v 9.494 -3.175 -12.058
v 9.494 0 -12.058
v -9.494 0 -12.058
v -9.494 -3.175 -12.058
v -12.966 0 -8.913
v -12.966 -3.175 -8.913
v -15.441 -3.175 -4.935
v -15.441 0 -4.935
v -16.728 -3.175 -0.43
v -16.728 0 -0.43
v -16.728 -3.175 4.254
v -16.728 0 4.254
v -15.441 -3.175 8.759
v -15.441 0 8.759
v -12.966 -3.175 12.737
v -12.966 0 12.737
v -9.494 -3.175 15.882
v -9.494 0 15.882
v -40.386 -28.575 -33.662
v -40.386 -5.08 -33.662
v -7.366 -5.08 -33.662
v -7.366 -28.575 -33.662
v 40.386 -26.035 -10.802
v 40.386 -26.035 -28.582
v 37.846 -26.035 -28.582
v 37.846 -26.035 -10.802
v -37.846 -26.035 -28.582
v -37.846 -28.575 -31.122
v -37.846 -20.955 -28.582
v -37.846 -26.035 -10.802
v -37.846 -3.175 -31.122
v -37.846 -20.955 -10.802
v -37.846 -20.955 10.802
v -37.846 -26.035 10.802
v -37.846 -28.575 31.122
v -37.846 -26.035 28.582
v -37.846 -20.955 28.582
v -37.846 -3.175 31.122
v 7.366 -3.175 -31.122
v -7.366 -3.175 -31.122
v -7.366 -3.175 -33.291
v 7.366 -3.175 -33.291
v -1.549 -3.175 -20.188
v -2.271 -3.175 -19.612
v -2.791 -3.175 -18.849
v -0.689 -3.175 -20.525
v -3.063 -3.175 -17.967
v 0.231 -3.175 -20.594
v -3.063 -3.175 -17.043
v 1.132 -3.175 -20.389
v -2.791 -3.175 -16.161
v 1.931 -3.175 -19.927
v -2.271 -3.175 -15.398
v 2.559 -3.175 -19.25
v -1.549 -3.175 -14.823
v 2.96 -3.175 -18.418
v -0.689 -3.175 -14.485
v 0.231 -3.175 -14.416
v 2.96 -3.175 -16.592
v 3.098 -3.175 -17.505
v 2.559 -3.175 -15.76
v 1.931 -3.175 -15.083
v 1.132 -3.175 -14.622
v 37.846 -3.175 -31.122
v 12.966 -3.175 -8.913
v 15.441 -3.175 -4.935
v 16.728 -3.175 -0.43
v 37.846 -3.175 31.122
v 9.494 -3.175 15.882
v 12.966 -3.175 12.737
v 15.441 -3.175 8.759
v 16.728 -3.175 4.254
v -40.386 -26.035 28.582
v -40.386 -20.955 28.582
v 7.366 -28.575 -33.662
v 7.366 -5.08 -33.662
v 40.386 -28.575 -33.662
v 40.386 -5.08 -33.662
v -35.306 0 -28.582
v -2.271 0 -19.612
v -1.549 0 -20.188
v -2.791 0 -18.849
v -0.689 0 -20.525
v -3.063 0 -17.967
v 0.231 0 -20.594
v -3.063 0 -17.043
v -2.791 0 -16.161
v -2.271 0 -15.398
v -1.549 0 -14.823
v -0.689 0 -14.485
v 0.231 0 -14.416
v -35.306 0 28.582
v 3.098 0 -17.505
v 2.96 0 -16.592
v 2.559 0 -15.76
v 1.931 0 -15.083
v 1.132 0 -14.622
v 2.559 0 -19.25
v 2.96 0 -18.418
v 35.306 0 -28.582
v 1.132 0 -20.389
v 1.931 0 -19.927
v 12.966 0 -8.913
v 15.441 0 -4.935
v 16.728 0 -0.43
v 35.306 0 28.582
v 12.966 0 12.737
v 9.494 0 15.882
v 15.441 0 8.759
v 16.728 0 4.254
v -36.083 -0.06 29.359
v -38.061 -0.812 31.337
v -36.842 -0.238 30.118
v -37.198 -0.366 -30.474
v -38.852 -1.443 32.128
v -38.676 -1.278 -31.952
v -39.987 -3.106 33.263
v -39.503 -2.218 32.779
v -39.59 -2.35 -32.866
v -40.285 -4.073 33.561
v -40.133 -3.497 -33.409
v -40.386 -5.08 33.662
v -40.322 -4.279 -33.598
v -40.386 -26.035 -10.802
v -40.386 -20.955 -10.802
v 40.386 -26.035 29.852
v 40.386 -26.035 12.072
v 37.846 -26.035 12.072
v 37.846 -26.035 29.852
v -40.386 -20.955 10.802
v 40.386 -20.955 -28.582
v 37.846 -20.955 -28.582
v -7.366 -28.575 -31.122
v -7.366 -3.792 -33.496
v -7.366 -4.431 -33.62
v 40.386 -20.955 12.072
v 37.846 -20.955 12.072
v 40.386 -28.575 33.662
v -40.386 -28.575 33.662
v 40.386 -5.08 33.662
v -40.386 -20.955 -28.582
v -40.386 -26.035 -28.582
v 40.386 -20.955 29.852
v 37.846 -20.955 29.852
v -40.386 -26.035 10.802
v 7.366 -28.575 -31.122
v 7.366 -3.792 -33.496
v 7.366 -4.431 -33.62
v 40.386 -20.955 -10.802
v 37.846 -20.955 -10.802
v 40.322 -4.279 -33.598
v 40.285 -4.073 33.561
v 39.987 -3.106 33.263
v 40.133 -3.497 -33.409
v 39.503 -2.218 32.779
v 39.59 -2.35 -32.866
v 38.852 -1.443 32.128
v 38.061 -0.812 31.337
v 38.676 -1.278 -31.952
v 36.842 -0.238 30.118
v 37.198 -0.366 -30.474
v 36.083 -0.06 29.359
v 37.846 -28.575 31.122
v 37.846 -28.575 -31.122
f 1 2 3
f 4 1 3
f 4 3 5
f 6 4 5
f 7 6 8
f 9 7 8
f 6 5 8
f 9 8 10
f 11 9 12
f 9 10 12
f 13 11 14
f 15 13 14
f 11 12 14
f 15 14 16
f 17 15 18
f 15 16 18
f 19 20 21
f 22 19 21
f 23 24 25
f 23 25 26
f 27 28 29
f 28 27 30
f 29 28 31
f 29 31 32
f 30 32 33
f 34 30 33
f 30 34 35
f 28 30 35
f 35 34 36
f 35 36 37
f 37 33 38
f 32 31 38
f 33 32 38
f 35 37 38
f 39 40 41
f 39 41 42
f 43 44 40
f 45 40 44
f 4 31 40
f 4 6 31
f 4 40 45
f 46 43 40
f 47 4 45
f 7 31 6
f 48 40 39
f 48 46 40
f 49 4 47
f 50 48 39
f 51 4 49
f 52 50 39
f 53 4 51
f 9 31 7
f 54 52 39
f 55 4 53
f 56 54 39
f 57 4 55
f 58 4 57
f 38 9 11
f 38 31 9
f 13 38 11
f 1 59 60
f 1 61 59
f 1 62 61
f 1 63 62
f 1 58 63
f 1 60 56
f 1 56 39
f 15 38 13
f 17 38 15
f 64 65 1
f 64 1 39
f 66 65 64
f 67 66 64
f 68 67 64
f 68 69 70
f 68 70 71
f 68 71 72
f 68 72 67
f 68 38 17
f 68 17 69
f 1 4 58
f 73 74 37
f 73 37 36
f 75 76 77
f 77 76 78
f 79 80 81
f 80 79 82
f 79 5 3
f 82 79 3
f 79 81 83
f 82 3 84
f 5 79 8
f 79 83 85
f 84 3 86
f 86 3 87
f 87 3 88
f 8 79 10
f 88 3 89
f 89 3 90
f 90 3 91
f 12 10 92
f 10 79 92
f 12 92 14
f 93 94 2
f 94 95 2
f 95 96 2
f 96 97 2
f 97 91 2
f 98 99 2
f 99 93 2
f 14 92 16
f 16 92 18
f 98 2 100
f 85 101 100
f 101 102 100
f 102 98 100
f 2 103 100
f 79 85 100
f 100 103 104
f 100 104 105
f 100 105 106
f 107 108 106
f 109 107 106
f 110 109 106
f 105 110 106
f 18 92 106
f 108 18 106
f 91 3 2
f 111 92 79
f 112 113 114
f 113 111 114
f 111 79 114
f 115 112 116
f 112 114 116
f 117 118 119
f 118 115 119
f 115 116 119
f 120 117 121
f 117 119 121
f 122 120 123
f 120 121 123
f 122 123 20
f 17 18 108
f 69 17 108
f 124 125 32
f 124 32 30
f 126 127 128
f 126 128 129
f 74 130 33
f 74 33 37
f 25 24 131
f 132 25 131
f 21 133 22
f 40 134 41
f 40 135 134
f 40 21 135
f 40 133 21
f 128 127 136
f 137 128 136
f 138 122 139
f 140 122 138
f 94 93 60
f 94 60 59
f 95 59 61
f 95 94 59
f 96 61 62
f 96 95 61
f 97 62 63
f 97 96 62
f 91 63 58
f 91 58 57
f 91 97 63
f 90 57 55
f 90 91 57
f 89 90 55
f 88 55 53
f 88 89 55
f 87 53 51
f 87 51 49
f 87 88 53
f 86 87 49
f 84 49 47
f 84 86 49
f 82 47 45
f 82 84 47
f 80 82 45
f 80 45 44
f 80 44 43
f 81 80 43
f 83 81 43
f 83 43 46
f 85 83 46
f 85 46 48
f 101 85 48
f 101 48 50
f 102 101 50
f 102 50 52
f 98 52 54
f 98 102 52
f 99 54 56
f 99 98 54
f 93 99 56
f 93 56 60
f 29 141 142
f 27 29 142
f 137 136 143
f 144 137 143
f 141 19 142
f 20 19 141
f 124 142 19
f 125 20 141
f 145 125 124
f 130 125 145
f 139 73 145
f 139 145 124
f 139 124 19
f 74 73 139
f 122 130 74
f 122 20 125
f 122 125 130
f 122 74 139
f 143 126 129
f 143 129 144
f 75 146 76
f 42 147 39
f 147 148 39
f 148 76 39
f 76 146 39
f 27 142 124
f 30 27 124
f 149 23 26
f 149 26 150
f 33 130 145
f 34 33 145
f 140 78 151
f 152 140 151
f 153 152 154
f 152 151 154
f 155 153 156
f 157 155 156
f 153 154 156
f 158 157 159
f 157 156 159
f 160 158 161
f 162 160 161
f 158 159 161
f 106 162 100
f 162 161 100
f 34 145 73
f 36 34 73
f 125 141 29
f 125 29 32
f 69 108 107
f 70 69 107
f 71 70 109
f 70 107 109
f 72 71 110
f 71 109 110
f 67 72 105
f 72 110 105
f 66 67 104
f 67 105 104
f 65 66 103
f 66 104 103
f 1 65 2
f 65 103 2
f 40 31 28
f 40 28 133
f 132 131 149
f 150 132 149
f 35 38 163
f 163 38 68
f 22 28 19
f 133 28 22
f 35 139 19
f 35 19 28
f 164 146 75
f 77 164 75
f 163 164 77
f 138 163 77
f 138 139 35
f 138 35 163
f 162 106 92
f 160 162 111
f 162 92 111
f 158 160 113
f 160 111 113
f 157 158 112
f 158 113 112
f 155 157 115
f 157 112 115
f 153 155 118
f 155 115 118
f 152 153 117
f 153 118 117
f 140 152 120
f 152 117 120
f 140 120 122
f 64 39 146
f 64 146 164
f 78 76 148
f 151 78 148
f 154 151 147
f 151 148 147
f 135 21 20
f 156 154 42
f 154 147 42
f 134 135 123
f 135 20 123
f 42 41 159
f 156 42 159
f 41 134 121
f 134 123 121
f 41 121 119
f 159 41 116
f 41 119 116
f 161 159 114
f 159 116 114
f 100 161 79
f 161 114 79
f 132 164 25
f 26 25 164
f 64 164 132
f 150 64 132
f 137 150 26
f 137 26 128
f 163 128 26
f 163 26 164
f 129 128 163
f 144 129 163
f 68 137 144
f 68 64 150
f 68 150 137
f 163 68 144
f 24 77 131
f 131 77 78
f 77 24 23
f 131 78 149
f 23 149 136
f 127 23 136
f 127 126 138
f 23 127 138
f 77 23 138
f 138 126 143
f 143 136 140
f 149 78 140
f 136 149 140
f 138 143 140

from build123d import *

# Parameters (mm, degrees)
F0_W         = 80.772
F0_H         = 67.3239192
F0_R         = 3.0975808
F1_DEPTH     = 3.175
F2_W         = 80.772
F2_H         = 67.3239192
F2_W_2       = 75.692
F2_H_2       = 62.2439192
F3_DEPTH     = 25.4
F4_W         = 14.732
F4_H         = 25.4
F5_DEPTH     = 25.4
F6_W         = 5.08
F6_H         = 17.78
F7_DEPTH     = 25.4
F8_W         = 5.08
F8_H         = 17.78
F9_DEPTH     = 25.4
F10_T1_DEPTH = 106.172
F10_T3_DEPTH = 92.7239192


# Not quite as in the source:
# - a fillet or chamfer that OpenCascade refuses, or shapes differently, is made with other operations: its cross-section is extruded or revolved along the edge and cut away or added


with BuildPart() as f1:
    # F0 (on Front) → F1 (new body)
    with BuildSketch(Plane.XZ):
        Rectangle(F0_W, F0_H)
        with Locations((0, -17.5051212)):
            Circle(F0_R, mode=Mode.SUBTRACT)
        with BuildLine():
            Line((9.4944692, -12.0580404), (-9.4944692, -12.0580404))
            ThreePointArc((-9.4944692, -12.0580404), (-16.8909981247, 1.9119596), (-9.4944692, 15.8819596))
            Line((-9.4944692, 15.8819596), (9.4944692, 15.8819596))
            ThreePointArc((9.4944692, 15.8819596), (16.8909981247, 1.9119596), (9.4944692, -12.0580404))
        make_face(mode=Mode.SUBTRACT)
    extrude(amount=F1_DEPTH)

    # F2 (on face) → F3 (join)
    with BuildSketch(Plane.XZ.offset(3.175)):
        Rectangle(F2_W, F2_H)
        Rectangle(F2_W_2, F2_H_2, mode=Mode.SUBTRACT)
    extrude(amount=F3_DEPTH)

    # F4 (on face) → F5 (cut)
    with BuildSketch(Plane.XY.offset(-31.1219596)):
        with Locations((0, -15.875)):
            Rectangle(F4_W, F4_H)
    extrude(amount=-F5_DEPTH, mode=Mode.SUBTRACT)

    # F6 (on face) → F7 (cut)
    with BuildSketch(Plane.YZ.offset(40.386)):
        with Locations((-23.495, 20.9619596)):
            Rectangle(F6_W, F6_H)
        with Locations((-23.495, -19.6919596)):
            Rectangle(F6_W, F6_H)
    extrude(amount=-F7_DEPTH, mode=Mode.SUBTRACT)

    # F8 (on face) → F9 (cut)
    with BuildSketch(Plane(origin=(-40.386, 0, 0), x_dir=(0, -1, 0), z_dir=(-1, 0, 0))):
        with Locations((23.495, 19.6919596)):
            Rectangle(F8_W, F8_H)
        with Locations((23.495, -19.6919596)):
            Rectangle(F8_W, F8_H)
    extrude(amount=-F9_DEPTH, mode=Mode.SUBTRACT)

    # F10: fillet of radius 5.08 on 4 edges, made by hand

    # F10_s2 → F10_t1 (cut)
    with BuildSketch(Plane.YZ.offset(-53.086)):
        with BuildLine():
            ThreePointArc((0, 28.5819596), (-1.4878975516, 32.1740620484), (-5.08, 33.6619596))
            Line((-5.08, 33.6619596), (0, 33.6619596))
            Line((0, 33.6619596), (0, 28.5819596))
        make_face()
        with BuildLine():
            ThreePointArc((-5.08, -33.6619596), (-1.4878975516, -32.1740620484), (0, -28.5819596))
            Line((0, -28.5819596), (0, -33.6619596))
            Line((0, -33.6619596), (-5.08, -33.6619596))
        make_face()
    extrude(amount=F10_T1_DEPTH, mode=Mode.SUBTRACT)

    # F10_s4 → F10_t3 (cut)
    with BuildSketch(Plane.XY.offset(-46.3619596)):
        with BuildLine():
            ThreePointArc((-35.306, 0), (-38.8981024484, -1.4878975516), (-40.386, -5.08))
            Line((-40.386, -5.08), (-40.386, 0))
            Line((-40.386, 0), (-35.306, 0))
        make_face()
        with BuildLine():
            ThreePointArc((40.386, -5.08), (38.8981024484, -1.4878975516), (35.306, 0))
            Line((35.306, 0), (40.386, 0))
            Line((40.386, 0), (40.386, -5.08))
        make_face()
    extrude(amount=F10_T3_DEPTH, mode=Mode.SUBTRACT)


solid = f1.part
